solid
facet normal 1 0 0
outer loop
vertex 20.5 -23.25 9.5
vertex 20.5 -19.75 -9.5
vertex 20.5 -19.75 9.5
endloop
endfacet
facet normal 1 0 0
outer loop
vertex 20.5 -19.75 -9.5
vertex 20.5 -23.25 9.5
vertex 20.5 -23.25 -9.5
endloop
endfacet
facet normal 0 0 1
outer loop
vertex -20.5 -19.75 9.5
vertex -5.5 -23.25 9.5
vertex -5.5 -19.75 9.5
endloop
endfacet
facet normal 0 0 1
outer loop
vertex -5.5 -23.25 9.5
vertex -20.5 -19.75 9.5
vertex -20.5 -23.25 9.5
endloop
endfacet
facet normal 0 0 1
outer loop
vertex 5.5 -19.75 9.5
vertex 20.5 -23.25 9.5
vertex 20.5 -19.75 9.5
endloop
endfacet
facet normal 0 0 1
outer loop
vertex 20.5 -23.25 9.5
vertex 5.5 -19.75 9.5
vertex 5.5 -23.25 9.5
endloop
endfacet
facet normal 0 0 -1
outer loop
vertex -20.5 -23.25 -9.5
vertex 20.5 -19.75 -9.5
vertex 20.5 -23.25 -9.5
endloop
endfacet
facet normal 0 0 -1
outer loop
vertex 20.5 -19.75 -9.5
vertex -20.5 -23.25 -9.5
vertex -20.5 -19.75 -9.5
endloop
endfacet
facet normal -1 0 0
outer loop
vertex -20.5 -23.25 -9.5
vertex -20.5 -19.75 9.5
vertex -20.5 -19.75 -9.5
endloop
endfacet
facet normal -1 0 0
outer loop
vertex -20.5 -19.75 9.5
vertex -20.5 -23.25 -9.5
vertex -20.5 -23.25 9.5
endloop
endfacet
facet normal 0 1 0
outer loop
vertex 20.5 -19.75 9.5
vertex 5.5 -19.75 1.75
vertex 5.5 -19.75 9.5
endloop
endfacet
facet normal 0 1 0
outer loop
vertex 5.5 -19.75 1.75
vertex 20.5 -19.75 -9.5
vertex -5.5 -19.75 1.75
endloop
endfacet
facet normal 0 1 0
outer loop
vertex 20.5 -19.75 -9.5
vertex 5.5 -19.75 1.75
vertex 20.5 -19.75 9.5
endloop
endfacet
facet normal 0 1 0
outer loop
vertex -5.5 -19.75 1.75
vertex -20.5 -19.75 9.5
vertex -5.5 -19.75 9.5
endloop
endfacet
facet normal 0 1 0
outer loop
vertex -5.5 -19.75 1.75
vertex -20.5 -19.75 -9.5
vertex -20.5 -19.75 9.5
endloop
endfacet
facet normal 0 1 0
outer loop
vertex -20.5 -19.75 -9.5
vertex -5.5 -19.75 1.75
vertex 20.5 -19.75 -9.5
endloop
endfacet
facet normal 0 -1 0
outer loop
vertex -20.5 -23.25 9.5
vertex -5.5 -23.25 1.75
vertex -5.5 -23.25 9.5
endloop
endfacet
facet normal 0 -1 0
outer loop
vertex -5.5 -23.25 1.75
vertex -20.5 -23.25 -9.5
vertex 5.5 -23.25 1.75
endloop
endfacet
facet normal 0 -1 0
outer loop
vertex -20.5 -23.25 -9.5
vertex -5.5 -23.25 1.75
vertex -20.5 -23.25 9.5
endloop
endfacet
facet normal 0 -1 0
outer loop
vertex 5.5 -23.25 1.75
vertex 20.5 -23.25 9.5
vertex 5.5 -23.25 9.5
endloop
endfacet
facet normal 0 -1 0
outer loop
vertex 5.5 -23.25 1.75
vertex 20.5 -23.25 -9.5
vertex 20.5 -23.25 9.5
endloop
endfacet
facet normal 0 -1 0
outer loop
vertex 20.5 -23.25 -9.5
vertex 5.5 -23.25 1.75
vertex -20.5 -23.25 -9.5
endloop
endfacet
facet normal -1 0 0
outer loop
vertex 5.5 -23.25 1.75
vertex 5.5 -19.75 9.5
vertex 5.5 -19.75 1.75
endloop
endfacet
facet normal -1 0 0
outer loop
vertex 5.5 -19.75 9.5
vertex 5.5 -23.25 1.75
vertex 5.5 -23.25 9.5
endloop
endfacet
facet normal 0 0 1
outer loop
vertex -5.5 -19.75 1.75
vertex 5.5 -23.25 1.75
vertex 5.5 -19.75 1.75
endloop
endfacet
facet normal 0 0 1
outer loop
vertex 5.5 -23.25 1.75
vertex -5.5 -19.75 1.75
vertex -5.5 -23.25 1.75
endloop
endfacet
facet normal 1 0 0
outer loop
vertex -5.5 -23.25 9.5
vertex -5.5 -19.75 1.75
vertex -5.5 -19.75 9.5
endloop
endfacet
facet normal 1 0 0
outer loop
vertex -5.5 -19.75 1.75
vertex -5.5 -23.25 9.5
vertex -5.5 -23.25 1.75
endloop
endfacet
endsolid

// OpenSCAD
$fn = 100;


larg = 34;
alt = 12;
prof = 45.5;
esp = 3.5;

module caixa() {
    difference() {
        translate([0,esp,0]) cube([larg+2*esp,prof,alt+2*esp], center=true);
        cube([larg,prof,alt], center=true);
        
        // Furo para o sensor DS18B20
        //14mm da base até o inicio do buraco
        furo_uniforme();
    
       
        
        // Furo para fixação do imã
      translate([0,0,-8.5]) ima();
        translate([12,-14,-8.5]) ima();
        translate([-12,-14,-8.5]) ima();
        translate([-12,17,-8.5]) ima();
    }
}
module furo_uniforme(){
    hull(){
        //25mm da base até o inicio do furo no eixo Y
        translate([12.5,25,-9]) rotate([90,0,0]) DS18B20();
        translate([12.5,25,-7.5]) rotate([90,0,0]) DS18B20();
    }
}

module tampa() {
    difference() {
        translate([0,esp,0]) cube([larg+2*esp,esp,alt+2*esp], center=true);
        translate([0,0,6])cube([11,12,8.5], center = true);
    }
}

module DS18B20() {
    cylinder(d=7, h=54, center=true);
}
module ima() {
    cylinder( d=8.3, h=3, center=true);
}
module nicho(){
    cube([36,3.4,1]);
    
    
}
translate([0,-25,0]) tampa();
//rotate([0,0,-90]);

//nicho para melhor encaixe
//5mm de distancia da base
//translate([14,19,-0.2])rotate([0,0,-90])nicho();
//translate([-17,19,-0.2])rotate([0,0,-90])nicho();
////
//caixa();
